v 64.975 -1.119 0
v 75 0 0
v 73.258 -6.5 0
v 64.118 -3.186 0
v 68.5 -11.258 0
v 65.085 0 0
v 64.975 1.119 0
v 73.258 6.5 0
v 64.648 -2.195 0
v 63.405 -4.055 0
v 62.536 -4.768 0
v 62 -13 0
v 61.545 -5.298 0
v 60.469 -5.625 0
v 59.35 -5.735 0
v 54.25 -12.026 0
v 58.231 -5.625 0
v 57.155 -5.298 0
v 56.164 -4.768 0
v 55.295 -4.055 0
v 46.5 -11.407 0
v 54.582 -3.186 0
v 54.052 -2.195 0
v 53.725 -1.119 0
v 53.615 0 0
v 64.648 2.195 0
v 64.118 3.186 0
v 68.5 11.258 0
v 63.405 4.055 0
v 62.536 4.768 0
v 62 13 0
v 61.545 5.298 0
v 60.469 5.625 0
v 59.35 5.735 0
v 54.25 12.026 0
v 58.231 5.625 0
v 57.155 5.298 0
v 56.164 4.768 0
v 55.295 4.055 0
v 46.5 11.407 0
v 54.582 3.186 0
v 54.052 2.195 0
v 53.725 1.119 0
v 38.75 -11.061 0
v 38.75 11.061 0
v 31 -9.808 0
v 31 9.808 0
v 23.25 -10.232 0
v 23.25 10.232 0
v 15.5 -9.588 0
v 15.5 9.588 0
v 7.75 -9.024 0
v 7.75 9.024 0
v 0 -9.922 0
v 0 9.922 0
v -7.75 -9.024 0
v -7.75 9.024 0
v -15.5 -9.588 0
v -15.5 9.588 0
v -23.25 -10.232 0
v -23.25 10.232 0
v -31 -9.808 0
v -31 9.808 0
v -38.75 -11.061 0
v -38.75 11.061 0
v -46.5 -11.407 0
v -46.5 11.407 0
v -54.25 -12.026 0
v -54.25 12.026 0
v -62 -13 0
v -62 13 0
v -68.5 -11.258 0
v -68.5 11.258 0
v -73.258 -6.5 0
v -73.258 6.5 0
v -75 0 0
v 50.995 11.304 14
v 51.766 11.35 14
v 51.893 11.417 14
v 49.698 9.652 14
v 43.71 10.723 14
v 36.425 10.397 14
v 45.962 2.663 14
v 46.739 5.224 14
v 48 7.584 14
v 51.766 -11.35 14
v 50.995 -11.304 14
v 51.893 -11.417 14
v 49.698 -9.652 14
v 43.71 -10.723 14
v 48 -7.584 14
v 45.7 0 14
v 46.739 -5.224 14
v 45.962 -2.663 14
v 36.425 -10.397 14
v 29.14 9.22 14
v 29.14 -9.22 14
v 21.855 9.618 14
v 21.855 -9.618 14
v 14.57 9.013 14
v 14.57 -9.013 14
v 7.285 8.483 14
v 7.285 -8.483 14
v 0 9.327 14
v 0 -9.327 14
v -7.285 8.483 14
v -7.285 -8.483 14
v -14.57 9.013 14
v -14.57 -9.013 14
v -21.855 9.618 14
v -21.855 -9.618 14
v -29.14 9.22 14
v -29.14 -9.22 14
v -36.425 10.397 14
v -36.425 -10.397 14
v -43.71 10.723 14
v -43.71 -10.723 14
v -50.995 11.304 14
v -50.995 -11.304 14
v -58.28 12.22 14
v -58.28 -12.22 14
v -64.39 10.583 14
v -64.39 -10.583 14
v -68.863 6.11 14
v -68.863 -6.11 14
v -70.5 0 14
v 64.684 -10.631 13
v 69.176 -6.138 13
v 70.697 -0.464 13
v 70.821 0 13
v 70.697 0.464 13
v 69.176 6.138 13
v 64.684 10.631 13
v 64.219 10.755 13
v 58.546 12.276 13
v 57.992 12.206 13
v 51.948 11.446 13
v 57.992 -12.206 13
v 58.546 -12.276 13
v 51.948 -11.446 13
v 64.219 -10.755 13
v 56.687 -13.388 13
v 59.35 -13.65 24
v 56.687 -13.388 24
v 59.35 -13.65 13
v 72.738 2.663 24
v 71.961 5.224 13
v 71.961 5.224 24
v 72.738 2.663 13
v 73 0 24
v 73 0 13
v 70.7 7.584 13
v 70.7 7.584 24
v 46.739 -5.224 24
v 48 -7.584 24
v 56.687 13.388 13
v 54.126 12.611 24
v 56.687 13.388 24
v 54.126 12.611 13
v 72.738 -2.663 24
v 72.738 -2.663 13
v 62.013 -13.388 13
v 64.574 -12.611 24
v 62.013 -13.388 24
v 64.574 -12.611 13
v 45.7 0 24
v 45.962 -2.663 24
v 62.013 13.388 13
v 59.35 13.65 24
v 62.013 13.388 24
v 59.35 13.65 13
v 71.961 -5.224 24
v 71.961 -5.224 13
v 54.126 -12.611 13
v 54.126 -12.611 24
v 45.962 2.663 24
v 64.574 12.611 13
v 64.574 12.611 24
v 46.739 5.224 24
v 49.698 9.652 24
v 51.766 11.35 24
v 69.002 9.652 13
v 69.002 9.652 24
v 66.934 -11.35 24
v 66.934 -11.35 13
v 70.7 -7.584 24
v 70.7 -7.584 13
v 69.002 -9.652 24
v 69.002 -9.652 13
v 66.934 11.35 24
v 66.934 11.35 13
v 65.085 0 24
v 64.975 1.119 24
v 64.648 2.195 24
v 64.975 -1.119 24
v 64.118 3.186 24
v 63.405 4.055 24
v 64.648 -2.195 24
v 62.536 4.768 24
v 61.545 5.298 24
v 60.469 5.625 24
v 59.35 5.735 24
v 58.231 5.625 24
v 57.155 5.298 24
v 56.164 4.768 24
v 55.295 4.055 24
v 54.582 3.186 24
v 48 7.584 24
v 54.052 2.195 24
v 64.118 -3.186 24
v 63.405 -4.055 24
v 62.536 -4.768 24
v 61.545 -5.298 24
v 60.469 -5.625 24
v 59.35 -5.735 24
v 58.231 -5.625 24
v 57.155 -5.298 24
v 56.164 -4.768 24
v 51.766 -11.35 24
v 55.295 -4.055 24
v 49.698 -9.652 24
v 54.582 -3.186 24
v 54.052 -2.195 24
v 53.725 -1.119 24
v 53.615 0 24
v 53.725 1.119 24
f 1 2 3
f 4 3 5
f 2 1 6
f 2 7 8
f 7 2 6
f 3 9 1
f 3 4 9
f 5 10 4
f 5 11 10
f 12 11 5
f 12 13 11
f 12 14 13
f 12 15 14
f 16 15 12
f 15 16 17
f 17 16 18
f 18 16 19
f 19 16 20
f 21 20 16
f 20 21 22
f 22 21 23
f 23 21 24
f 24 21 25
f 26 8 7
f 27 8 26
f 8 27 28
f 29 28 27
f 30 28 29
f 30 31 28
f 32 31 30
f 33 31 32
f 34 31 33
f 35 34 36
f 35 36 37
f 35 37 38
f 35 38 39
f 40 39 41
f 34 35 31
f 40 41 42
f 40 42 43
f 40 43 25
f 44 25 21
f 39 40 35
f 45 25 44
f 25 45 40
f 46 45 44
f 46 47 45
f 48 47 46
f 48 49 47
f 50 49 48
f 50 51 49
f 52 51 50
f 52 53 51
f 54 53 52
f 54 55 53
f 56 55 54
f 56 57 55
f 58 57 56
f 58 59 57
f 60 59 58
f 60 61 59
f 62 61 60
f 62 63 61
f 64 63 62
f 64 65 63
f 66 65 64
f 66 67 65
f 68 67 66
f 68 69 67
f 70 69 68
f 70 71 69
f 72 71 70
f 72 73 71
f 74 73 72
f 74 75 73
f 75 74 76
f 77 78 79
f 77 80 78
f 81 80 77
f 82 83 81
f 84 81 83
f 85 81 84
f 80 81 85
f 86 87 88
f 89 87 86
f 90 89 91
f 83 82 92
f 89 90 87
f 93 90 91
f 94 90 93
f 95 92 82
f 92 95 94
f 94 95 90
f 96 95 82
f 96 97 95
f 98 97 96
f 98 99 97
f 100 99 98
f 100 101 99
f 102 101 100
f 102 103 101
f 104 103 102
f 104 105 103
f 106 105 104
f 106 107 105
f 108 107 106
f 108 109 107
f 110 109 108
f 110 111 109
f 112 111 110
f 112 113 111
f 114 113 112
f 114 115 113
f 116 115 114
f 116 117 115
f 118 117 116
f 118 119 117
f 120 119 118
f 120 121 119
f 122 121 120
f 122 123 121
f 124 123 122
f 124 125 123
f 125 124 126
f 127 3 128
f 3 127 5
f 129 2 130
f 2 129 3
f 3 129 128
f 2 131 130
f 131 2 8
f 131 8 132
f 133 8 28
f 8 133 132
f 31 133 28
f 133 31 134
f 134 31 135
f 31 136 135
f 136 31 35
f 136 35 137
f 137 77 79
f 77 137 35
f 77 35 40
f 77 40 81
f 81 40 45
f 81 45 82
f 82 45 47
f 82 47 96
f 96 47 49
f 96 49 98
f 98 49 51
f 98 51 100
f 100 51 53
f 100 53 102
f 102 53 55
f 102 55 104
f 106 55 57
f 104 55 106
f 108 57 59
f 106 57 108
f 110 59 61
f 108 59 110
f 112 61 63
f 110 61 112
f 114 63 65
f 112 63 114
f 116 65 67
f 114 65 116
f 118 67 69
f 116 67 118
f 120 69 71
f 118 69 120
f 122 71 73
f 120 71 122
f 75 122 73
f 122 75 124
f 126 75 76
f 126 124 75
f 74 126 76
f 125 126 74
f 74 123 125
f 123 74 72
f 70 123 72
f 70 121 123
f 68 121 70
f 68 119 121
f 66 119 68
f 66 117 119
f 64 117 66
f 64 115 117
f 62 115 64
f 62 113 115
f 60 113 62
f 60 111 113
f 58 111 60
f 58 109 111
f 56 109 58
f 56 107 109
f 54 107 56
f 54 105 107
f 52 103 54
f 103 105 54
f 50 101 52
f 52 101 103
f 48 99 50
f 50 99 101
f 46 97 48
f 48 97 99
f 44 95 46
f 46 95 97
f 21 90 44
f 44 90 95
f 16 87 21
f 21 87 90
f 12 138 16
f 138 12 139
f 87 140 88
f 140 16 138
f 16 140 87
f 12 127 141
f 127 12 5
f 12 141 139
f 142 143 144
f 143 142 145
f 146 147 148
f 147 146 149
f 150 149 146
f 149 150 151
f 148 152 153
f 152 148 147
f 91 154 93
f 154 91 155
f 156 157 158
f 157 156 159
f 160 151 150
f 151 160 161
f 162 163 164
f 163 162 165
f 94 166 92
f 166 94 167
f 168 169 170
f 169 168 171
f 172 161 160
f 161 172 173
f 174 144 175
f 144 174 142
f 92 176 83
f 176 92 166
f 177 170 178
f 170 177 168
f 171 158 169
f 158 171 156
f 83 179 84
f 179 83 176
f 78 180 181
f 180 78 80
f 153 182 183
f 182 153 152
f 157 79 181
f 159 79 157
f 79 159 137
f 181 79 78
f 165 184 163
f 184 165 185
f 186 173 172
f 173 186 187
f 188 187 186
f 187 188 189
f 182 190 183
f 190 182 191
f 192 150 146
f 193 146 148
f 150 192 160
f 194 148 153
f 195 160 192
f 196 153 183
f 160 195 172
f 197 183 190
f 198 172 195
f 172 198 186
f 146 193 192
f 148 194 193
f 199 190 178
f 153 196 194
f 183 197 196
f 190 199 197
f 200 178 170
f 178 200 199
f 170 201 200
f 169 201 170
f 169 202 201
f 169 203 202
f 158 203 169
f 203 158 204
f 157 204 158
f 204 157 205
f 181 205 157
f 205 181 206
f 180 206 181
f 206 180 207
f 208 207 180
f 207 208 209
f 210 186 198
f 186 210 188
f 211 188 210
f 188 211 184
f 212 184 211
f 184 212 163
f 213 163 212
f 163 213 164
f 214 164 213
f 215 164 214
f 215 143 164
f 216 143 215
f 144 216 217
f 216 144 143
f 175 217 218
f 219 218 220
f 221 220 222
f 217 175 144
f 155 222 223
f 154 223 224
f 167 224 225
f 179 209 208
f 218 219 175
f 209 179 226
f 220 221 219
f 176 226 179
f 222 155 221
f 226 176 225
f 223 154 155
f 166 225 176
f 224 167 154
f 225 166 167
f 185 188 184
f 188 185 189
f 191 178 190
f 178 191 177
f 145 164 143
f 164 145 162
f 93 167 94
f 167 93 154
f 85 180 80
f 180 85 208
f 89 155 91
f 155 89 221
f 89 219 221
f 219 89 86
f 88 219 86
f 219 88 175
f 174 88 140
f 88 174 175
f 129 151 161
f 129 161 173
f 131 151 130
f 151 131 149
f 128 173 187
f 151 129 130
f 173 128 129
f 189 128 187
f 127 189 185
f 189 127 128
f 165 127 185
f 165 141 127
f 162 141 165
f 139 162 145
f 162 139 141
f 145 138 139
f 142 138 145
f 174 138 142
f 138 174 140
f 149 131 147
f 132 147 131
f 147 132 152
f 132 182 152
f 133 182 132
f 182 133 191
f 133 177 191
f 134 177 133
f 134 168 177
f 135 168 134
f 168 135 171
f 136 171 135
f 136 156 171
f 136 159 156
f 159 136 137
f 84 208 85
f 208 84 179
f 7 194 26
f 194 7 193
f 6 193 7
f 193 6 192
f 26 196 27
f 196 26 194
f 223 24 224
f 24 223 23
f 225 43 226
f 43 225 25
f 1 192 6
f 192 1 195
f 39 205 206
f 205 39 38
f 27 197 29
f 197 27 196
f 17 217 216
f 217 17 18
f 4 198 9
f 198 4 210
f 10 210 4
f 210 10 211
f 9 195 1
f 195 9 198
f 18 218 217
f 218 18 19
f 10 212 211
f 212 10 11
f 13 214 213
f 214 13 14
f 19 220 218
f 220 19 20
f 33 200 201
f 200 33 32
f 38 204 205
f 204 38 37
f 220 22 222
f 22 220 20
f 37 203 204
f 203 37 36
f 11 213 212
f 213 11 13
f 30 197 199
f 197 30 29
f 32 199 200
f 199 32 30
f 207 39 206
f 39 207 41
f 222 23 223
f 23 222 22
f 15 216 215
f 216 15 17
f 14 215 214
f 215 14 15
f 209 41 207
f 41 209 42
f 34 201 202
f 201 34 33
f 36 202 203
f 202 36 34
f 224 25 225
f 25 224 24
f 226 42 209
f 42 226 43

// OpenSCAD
$fn = 32;

// ----------------------------------------------------------------------
// Handle: 150 x 26 mm grip, 14 mm thick
// ----------------------------------------------------------------------

// --- parameters (mm) ---
length = 150;             // grip length
width = 26;               // grip width
thickness = 14;           // grip thickness
waist = 0.72;             // width factor at the middle
draft = 0.94;             // top face scale of the extrusion
scallops = 6;             // finger rests per side
ripple = 0.06;            // depth factor of the finger rests
boss_d = 27.3;            // mounting boss diameter
boss_h = 10;              // mounting boss height
boss_hole_d = 11.47;      // screw clearance through the boss
boss_r = 59.35;           // boss centre from the grip centre

/* ergonomic grip outline, closed spline-like polygon in the XY plane */
grip = [[-62, 13], [-54.25, 12.026], [-46.5, 11.407], [-38.75, 11.061], [-31, 9.808], [-23.25, 10.232], [-15.5, 9.588], [-7.75, 9.024], [0, 9.922], [7.75, 9.024], [15.5, 9.588], [23.25, 10.232], [31, 9.808], [38.75, 11.061], [46.5, 11.407], [54.25, 12.026], [62, 13], [68.5, 11.258], [73.258, 6.5], [75, 0], [73.258, -6.5], [68.5, -11.258], [62, -13], [62, -13], [54.25, -12.026], [46.5, -11.407], [38.75, -11.061], [31, -9.808], [23.25, -10.232], [15.5, -9.588], [7.75, -9.024], [0, -9.922], [-7.75, -9.024], [-15.5, -9.588], [-23.25, -10.232], [-31, -9.808], [-38.75, -11.061], [-46.5, -11.407], [-54.25, -12.026], [-62, -13], [-68.5, -11.258], [-73.258, -6.5], [-75, 0], [-73.258, 6.5], [-68.5, 11.258], [-62, 13]];

module grip_body() {
  linear_extrude(height = thickness, scale = draft) polygon(grip);
}

module boss_body() {
  /* sunk 1 mm into the grip so the joint overlaps */
  translate([boss_r, 0, thickness - 1]) cylinder(h = boss_h + 1, d = boss_d);
}

difference() {
  union() {
    grip_body();
    boss_body();
  }
  translate([boss_r, 0, -1]) cylinder(h = thickness + boss_h + 2, d = boss_hole_d);
}
